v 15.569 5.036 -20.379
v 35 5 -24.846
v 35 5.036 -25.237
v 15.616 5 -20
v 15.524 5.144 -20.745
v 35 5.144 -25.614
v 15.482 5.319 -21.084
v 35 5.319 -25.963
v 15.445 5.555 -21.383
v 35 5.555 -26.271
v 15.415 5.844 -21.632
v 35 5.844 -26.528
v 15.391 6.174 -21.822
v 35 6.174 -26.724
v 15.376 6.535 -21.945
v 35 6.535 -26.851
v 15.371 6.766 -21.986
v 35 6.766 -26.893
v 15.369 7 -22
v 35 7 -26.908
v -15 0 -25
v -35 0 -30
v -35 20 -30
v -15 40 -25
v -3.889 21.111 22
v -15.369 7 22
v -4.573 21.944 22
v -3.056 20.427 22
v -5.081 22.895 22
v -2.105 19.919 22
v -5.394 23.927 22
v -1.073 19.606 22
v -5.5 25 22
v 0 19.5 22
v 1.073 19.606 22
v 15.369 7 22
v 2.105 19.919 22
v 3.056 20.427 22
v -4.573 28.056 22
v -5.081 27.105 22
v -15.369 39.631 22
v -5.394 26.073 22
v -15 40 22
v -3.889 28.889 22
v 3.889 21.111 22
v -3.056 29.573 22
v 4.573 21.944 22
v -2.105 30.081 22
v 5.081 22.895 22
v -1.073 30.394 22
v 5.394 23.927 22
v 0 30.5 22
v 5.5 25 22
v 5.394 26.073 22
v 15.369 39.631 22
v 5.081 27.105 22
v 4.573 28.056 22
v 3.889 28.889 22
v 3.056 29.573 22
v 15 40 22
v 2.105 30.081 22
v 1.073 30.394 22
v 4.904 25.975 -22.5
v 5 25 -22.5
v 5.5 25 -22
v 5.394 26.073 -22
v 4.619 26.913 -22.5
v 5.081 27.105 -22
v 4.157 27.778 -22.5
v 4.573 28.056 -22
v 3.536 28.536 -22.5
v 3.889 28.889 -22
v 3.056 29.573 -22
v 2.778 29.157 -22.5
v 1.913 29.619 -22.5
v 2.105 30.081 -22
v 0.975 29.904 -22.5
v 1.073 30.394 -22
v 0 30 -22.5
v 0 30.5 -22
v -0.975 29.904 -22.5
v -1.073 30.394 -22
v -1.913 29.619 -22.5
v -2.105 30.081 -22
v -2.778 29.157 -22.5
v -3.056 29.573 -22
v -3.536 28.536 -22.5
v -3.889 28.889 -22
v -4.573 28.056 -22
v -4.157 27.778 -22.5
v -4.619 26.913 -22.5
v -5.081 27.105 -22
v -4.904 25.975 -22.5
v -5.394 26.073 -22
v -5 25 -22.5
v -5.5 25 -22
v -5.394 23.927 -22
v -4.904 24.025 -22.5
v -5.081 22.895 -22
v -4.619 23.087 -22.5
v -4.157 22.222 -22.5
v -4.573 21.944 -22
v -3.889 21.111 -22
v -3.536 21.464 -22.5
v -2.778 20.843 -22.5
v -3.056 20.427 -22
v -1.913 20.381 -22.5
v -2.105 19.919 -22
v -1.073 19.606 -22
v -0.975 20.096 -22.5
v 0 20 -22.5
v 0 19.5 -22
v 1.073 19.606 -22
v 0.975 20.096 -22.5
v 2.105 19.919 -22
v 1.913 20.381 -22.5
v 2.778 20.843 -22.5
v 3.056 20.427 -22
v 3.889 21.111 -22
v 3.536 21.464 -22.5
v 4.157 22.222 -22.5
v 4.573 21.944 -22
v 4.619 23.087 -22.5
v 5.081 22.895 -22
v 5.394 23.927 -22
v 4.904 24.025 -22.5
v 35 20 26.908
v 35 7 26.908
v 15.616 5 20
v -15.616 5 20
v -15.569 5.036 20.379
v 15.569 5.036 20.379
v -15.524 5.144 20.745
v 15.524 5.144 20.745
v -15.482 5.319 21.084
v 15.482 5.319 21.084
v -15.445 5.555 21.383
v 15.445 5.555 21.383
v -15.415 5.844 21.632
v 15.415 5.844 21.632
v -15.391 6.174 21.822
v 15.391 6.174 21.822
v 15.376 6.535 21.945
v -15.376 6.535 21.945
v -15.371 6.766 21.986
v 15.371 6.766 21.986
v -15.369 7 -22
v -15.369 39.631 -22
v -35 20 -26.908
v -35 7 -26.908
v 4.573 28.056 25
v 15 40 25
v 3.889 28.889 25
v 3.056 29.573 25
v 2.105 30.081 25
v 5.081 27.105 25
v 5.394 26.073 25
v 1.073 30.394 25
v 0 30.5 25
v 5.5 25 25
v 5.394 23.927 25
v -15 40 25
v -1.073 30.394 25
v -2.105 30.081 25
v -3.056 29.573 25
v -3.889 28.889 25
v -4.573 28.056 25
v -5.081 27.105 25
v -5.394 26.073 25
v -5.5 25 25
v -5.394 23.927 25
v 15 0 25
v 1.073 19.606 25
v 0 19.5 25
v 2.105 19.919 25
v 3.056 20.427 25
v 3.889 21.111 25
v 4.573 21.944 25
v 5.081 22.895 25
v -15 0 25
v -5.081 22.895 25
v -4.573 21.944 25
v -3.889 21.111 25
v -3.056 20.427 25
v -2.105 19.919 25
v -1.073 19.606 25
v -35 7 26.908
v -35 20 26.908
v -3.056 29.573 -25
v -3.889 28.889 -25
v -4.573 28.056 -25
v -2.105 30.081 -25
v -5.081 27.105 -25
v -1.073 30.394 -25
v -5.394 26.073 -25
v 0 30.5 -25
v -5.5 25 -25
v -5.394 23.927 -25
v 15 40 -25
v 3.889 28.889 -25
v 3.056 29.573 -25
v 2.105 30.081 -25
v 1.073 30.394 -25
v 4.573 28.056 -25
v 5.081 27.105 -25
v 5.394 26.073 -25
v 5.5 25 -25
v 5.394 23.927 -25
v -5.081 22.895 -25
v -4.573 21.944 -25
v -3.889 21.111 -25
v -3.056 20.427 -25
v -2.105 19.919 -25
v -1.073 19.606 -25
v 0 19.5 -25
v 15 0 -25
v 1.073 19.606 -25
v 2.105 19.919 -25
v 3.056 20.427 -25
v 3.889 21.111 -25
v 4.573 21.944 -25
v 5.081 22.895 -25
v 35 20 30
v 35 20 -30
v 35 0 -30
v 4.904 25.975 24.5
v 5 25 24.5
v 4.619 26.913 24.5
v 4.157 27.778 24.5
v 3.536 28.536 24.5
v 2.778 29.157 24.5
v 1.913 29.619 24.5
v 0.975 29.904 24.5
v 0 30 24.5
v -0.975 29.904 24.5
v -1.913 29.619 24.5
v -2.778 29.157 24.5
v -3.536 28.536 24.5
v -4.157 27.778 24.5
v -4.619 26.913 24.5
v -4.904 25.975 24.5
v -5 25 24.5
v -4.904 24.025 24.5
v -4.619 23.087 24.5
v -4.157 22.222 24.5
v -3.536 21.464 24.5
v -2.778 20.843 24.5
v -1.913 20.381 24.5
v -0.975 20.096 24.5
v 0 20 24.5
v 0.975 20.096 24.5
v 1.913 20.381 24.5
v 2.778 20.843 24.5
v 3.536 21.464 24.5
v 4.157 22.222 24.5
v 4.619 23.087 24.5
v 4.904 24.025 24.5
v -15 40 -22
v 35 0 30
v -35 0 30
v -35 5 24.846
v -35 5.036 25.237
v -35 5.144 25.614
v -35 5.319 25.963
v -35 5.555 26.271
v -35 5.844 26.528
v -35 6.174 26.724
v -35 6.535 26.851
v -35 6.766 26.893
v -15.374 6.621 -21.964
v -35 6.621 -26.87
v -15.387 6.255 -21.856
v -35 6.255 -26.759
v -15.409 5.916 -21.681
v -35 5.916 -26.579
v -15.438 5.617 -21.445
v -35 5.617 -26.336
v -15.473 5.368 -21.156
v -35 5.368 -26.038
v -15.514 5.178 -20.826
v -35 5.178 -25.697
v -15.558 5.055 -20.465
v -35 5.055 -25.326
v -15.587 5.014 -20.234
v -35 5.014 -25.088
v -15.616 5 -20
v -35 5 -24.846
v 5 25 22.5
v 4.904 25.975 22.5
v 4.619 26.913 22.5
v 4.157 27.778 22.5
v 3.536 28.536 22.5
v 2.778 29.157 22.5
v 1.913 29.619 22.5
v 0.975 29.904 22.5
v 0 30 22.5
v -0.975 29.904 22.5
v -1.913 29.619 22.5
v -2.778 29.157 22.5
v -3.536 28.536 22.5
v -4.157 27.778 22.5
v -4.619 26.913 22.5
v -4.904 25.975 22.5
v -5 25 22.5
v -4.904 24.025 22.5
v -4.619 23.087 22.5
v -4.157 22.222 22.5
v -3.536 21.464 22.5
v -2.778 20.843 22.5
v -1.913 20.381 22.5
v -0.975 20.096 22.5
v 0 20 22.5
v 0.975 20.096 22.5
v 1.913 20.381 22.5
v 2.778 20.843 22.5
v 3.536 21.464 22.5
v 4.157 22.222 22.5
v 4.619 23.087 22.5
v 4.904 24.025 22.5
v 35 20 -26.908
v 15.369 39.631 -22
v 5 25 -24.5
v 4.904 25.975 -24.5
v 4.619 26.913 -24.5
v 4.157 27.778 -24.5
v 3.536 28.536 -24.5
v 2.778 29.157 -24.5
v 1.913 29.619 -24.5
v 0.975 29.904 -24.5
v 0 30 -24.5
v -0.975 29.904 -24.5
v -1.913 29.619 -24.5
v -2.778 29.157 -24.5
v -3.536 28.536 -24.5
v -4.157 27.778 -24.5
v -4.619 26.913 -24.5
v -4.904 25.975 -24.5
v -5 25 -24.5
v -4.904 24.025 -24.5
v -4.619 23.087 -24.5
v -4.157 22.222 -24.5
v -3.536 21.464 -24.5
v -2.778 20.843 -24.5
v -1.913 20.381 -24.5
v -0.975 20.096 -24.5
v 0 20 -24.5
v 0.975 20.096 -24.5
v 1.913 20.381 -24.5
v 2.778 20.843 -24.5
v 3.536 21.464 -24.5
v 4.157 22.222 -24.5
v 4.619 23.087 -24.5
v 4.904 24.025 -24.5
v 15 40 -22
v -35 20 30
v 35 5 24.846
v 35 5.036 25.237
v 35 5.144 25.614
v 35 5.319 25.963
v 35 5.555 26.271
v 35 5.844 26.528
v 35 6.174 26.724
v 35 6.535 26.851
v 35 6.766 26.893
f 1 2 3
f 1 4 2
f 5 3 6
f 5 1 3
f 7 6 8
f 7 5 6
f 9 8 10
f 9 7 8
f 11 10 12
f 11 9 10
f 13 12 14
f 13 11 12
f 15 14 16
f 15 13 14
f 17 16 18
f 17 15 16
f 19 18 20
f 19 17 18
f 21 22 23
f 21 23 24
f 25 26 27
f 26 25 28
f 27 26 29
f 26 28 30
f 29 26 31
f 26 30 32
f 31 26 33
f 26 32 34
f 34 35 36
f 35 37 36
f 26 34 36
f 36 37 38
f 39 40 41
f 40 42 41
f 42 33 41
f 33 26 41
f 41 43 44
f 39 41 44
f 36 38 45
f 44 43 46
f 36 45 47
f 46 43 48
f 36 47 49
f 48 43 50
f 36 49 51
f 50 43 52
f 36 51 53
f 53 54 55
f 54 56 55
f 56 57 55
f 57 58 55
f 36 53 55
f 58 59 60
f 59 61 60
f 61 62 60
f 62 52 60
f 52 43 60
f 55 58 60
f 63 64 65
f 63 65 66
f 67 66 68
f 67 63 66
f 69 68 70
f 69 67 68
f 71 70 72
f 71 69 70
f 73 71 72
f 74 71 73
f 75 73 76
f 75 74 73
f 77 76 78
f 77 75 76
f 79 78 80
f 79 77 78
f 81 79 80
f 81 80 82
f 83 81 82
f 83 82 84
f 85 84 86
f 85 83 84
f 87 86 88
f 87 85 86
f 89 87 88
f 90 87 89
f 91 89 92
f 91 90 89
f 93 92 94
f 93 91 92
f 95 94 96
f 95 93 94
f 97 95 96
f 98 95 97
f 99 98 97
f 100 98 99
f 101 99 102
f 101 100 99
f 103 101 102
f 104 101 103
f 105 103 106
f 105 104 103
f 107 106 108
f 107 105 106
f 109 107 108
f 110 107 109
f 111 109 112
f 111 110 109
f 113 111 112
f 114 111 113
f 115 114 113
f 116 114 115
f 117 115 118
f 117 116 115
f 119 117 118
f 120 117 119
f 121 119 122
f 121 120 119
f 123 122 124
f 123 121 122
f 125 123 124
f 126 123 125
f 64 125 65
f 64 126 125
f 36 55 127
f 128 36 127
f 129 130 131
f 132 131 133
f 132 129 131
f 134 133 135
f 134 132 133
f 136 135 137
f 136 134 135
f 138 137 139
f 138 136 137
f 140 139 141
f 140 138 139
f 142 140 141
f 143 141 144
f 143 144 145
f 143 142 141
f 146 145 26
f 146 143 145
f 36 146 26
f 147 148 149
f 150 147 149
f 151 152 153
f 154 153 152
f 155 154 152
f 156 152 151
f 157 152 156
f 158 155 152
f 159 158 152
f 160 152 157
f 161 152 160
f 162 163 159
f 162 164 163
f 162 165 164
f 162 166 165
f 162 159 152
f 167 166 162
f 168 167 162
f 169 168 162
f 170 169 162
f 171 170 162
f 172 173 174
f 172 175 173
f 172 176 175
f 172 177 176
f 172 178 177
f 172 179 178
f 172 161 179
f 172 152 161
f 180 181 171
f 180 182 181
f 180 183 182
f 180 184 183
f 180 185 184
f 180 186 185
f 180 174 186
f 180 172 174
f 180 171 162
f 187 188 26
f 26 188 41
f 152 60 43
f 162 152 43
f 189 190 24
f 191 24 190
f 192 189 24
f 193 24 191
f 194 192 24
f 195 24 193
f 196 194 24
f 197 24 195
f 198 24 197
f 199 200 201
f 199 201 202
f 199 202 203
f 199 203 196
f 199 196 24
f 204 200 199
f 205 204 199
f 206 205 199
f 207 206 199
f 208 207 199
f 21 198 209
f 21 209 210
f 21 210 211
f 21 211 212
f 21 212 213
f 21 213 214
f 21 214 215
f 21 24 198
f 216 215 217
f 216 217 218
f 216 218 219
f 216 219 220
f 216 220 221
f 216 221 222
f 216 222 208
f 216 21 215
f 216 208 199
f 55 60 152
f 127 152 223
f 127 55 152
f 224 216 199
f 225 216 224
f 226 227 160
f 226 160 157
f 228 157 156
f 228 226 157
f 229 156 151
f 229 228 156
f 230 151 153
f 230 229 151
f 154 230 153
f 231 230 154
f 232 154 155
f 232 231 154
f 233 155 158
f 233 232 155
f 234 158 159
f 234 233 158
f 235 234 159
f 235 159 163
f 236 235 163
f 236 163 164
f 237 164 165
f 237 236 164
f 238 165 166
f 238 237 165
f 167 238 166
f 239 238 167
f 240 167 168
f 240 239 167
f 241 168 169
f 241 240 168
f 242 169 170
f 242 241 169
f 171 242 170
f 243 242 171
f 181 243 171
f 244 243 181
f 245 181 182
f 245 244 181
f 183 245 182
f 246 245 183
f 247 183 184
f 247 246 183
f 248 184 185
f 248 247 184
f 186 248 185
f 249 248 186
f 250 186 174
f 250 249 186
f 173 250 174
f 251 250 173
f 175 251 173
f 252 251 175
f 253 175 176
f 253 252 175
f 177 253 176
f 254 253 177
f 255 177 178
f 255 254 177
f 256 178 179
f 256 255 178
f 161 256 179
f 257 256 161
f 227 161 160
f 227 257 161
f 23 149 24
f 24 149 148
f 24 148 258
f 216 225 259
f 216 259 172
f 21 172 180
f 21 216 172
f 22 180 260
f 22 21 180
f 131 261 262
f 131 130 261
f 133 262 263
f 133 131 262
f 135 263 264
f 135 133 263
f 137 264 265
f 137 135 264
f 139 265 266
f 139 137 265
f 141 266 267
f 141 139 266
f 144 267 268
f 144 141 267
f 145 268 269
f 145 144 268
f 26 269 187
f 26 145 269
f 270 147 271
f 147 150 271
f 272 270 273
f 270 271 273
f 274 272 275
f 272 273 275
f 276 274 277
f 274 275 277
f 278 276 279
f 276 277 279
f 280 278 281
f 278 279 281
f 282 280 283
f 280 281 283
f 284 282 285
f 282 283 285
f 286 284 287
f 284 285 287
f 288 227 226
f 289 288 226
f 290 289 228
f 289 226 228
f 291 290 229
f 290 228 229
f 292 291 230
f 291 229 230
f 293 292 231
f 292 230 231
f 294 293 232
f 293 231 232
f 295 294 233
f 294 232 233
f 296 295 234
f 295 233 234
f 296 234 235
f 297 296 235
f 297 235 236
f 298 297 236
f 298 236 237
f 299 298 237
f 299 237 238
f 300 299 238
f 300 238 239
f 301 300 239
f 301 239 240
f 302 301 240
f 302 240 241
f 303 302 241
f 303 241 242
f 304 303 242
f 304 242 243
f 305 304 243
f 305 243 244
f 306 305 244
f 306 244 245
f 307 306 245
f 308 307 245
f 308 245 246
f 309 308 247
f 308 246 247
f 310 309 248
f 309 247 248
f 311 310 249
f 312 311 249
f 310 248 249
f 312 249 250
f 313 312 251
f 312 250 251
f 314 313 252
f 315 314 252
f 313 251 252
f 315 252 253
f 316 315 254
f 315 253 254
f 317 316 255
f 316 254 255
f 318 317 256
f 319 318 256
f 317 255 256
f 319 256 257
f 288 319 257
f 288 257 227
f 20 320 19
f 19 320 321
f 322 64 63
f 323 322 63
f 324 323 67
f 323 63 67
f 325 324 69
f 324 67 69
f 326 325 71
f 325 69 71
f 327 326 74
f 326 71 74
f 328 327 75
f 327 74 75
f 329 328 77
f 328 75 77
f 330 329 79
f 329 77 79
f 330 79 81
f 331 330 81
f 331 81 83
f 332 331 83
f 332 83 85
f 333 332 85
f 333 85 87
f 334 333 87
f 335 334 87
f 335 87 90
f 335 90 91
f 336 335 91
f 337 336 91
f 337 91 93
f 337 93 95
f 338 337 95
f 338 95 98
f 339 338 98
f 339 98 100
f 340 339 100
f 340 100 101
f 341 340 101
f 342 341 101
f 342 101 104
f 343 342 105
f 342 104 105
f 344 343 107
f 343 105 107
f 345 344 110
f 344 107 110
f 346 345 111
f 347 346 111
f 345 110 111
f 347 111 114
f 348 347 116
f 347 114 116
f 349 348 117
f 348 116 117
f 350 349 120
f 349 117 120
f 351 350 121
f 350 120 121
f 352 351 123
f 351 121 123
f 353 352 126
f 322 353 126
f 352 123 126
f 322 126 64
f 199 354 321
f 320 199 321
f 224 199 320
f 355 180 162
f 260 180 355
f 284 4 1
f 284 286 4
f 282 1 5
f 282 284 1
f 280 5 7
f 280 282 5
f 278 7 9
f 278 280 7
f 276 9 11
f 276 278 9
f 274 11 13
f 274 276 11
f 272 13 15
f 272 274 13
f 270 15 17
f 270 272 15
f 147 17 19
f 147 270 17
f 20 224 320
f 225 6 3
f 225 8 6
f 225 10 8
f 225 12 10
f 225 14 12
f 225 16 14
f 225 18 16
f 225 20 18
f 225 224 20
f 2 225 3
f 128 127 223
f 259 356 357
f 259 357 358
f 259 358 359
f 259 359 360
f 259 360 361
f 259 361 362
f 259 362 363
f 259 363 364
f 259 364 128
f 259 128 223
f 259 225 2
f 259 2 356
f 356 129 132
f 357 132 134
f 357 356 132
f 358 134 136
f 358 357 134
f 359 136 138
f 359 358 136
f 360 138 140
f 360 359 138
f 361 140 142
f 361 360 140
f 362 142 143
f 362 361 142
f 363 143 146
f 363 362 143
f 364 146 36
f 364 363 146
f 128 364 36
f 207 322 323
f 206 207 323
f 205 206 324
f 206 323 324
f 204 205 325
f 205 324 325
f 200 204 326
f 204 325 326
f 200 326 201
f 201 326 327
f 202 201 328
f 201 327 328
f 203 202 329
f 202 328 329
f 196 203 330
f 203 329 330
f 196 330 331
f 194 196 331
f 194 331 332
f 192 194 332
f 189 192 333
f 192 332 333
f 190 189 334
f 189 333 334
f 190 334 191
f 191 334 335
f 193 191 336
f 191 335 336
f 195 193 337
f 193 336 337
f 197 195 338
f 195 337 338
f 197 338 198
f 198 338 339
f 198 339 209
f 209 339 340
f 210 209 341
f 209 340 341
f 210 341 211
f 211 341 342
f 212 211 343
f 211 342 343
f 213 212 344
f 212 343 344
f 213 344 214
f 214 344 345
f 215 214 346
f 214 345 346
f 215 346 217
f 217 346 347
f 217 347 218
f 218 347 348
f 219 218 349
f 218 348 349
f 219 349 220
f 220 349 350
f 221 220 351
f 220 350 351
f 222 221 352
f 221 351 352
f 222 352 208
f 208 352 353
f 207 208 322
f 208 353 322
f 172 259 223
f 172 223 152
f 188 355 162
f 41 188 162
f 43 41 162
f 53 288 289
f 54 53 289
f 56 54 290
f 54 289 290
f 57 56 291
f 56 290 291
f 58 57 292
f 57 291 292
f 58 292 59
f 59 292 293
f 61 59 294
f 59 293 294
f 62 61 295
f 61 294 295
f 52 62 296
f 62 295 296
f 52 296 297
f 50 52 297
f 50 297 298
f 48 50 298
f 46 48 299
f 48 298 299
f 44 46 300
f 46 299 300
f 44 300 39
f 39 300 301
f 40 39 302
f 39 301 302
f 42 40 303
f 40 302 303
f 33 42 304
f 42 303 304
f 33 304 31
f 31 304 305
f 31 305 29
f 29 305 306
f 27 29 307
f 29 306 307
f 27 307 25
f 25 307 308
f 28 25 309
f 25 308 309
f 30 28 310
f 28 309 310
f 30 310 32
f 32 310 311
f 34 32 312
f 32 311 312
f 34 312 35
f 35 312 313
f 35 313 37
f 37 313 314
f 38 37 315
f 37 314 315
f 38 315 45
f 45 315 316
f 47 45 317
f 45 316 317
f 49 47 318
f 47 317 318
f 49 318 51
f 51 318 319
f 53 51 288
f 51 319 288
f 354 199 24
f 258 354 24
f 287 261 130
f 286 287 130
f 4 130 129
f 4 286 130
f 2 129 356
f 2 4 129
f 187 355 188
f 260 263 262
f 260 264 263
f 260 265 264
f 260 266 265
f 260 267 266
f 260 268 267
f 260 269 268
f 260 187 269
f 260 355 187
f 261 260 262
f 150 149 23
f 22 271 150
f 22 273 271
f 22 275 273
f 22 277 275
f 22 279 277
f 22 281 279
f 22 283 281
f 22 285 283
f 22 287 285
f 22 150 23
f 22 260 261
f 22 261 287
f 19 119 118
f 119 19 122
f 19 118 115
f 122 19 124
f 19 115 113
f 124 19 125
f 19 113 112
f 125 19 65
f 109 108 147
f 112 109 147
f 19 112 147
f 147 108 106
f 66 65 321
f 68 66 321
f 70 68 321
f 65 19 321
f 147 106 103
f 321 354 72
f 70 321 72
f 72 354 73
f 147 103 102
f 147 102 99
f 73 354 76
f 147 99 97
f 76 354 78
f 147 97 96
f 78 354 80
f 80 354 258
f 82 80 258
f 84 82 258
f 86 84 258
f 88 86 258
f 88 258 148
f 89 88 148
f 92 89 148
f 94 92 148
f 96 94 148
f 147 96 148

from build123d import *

# Parameters (mm, degrees)
BOSS_EXTRUDE1_DEPTH = 40
CUT_EXTRUDE1_DEPTH  = 35
CHAMFER1_SIZE       = 20
SKETCH4_R           = 5
CUT_EXTRUDE2_DEPTH  = 77.485292704
FILLET1_R           = 2
CHAMFER2_SIZE       = 0.5


with BuildPart() as part:
    # Sketch1 → Boss-Extrude1 (new body)
    with BuildSketch(Plane(origin=(0, 0, 0), x_dir=(1, 0, 0), z_dir=(0, 1, 0))):
        Polygon((-35, -30), (-35, 30), (-15, 25), (15, 25), (35, 30), (35, -30), (15, -25), (-15, -25), align=None)
    extrude(amount=BOSS_EXTRUDE1_DEPTH)

    # Sketch2 → Cut-Extrude1 (cut)
    with BuildSketch(Plane(origin=(0, 40, 0), x_dir=(1, 0, 0), z_dir=(0, 1, 0))):
        Polygon((-15.369316877, 22), (-49.922572363, 30.638313872), (-49.922572363, -30.638313872), (-15.369316877, -22), (15.369316877, -22), (46.296501907, -29.731796258), (46.296501907, 29.731796258), (15.369316877, 22), align=None)
    extrude(amount=-CUT_EXTRUDE1_DEPTH, mode=Mode.SUBTRACT)

    # Chamfer1
    # the kernel refuses this chamfer: 20 mm, written as the material it takes off along each edge
    with BuildSketch(Plane(origin=(35, 40, -24.525988979), x_dir=(-0.9996219169112968, 0.027495876610586317, 0), z_dir=(0, 0, 1)), Plane(origin=(35, 40, -81.433659759), x_dir=(-0.9996219169112968, 0.027495876610586317, 0), z_dir=(0, 0, 1))) as chamfer1_piece_1:
        Polygon((CHAMFER1_SIZE * 0.999621916911, CHAMFER1_SIZE * 0.0274958766106), (-CHAMFER1_SIZE * 0.0274958766106, CHAMFER1_SIZE * 0.999621916911), (0, 0), align=None)
    extrude(amount=105.959648738, mode=Mode.SUBTRACT)
    with BuildSketch(Plane(origin=(-35, 40, 24.525988979), x_dir=(-0.027495876610586317, -0.9996219169112968, 0), z_dir=(0, 0, -1)), Plane(origin=(-35, 40, 81.433659759), x_dir=(-0.027495876610586317, -0.9996219169112968, 0), z_dir=(0, 0, -1))) as chamfer1_piece_2:
        Polygon((CHAMFER1_SIZE * 0.999621916911, -CHAMFER1_SIZE * 0.0274958766106), (-CHAMFER1_SIZE * 0.0274958766106, -CHAMFER1_SIZE * 0.999621916911), (0, 0), align=None)
    extrude(amount=105.959648738, mode=Mode.SUBTRACT)

    # Sketch4 → Cut-Extrude2 (cut, through all)
    with BuildSketch(Plane.XY.offset(25)):
        with Locations((0, 25)):
            Circle(SKETCH4_R)
    extrude(amount=-CUT_EXTRUDE2_DEPTH, mode=Mode.SUBTRACT)

    # Fillet1
    fillet1_edges = [part.edges().sort_by_distance(p)[0] for p in [
        (25.184658438, 5, -24.45383539),
        (25.184658438, 5, 24.45383539),
        (-25.184658438, 5, 24.45383539),
        (-25.184658438, 5, -24.45383539),
        (0, 5, -22),
        (0, 5, 22),
    ]]
    fillet(fillet1_edges, radius=FILLET1_R)

    # Chamfer2
    chamfer2_edges = [part.edges().sort_by_distance(p)[0] for p in [
        (-5, 25, -22),
        (-5, 25, -25),
        (-5, 25, 22),
        (-5, 25, 25),
    ]]
    chamfer(chamfer2_edges, length=CHAMFER2_SIZE)


solid = part.part
